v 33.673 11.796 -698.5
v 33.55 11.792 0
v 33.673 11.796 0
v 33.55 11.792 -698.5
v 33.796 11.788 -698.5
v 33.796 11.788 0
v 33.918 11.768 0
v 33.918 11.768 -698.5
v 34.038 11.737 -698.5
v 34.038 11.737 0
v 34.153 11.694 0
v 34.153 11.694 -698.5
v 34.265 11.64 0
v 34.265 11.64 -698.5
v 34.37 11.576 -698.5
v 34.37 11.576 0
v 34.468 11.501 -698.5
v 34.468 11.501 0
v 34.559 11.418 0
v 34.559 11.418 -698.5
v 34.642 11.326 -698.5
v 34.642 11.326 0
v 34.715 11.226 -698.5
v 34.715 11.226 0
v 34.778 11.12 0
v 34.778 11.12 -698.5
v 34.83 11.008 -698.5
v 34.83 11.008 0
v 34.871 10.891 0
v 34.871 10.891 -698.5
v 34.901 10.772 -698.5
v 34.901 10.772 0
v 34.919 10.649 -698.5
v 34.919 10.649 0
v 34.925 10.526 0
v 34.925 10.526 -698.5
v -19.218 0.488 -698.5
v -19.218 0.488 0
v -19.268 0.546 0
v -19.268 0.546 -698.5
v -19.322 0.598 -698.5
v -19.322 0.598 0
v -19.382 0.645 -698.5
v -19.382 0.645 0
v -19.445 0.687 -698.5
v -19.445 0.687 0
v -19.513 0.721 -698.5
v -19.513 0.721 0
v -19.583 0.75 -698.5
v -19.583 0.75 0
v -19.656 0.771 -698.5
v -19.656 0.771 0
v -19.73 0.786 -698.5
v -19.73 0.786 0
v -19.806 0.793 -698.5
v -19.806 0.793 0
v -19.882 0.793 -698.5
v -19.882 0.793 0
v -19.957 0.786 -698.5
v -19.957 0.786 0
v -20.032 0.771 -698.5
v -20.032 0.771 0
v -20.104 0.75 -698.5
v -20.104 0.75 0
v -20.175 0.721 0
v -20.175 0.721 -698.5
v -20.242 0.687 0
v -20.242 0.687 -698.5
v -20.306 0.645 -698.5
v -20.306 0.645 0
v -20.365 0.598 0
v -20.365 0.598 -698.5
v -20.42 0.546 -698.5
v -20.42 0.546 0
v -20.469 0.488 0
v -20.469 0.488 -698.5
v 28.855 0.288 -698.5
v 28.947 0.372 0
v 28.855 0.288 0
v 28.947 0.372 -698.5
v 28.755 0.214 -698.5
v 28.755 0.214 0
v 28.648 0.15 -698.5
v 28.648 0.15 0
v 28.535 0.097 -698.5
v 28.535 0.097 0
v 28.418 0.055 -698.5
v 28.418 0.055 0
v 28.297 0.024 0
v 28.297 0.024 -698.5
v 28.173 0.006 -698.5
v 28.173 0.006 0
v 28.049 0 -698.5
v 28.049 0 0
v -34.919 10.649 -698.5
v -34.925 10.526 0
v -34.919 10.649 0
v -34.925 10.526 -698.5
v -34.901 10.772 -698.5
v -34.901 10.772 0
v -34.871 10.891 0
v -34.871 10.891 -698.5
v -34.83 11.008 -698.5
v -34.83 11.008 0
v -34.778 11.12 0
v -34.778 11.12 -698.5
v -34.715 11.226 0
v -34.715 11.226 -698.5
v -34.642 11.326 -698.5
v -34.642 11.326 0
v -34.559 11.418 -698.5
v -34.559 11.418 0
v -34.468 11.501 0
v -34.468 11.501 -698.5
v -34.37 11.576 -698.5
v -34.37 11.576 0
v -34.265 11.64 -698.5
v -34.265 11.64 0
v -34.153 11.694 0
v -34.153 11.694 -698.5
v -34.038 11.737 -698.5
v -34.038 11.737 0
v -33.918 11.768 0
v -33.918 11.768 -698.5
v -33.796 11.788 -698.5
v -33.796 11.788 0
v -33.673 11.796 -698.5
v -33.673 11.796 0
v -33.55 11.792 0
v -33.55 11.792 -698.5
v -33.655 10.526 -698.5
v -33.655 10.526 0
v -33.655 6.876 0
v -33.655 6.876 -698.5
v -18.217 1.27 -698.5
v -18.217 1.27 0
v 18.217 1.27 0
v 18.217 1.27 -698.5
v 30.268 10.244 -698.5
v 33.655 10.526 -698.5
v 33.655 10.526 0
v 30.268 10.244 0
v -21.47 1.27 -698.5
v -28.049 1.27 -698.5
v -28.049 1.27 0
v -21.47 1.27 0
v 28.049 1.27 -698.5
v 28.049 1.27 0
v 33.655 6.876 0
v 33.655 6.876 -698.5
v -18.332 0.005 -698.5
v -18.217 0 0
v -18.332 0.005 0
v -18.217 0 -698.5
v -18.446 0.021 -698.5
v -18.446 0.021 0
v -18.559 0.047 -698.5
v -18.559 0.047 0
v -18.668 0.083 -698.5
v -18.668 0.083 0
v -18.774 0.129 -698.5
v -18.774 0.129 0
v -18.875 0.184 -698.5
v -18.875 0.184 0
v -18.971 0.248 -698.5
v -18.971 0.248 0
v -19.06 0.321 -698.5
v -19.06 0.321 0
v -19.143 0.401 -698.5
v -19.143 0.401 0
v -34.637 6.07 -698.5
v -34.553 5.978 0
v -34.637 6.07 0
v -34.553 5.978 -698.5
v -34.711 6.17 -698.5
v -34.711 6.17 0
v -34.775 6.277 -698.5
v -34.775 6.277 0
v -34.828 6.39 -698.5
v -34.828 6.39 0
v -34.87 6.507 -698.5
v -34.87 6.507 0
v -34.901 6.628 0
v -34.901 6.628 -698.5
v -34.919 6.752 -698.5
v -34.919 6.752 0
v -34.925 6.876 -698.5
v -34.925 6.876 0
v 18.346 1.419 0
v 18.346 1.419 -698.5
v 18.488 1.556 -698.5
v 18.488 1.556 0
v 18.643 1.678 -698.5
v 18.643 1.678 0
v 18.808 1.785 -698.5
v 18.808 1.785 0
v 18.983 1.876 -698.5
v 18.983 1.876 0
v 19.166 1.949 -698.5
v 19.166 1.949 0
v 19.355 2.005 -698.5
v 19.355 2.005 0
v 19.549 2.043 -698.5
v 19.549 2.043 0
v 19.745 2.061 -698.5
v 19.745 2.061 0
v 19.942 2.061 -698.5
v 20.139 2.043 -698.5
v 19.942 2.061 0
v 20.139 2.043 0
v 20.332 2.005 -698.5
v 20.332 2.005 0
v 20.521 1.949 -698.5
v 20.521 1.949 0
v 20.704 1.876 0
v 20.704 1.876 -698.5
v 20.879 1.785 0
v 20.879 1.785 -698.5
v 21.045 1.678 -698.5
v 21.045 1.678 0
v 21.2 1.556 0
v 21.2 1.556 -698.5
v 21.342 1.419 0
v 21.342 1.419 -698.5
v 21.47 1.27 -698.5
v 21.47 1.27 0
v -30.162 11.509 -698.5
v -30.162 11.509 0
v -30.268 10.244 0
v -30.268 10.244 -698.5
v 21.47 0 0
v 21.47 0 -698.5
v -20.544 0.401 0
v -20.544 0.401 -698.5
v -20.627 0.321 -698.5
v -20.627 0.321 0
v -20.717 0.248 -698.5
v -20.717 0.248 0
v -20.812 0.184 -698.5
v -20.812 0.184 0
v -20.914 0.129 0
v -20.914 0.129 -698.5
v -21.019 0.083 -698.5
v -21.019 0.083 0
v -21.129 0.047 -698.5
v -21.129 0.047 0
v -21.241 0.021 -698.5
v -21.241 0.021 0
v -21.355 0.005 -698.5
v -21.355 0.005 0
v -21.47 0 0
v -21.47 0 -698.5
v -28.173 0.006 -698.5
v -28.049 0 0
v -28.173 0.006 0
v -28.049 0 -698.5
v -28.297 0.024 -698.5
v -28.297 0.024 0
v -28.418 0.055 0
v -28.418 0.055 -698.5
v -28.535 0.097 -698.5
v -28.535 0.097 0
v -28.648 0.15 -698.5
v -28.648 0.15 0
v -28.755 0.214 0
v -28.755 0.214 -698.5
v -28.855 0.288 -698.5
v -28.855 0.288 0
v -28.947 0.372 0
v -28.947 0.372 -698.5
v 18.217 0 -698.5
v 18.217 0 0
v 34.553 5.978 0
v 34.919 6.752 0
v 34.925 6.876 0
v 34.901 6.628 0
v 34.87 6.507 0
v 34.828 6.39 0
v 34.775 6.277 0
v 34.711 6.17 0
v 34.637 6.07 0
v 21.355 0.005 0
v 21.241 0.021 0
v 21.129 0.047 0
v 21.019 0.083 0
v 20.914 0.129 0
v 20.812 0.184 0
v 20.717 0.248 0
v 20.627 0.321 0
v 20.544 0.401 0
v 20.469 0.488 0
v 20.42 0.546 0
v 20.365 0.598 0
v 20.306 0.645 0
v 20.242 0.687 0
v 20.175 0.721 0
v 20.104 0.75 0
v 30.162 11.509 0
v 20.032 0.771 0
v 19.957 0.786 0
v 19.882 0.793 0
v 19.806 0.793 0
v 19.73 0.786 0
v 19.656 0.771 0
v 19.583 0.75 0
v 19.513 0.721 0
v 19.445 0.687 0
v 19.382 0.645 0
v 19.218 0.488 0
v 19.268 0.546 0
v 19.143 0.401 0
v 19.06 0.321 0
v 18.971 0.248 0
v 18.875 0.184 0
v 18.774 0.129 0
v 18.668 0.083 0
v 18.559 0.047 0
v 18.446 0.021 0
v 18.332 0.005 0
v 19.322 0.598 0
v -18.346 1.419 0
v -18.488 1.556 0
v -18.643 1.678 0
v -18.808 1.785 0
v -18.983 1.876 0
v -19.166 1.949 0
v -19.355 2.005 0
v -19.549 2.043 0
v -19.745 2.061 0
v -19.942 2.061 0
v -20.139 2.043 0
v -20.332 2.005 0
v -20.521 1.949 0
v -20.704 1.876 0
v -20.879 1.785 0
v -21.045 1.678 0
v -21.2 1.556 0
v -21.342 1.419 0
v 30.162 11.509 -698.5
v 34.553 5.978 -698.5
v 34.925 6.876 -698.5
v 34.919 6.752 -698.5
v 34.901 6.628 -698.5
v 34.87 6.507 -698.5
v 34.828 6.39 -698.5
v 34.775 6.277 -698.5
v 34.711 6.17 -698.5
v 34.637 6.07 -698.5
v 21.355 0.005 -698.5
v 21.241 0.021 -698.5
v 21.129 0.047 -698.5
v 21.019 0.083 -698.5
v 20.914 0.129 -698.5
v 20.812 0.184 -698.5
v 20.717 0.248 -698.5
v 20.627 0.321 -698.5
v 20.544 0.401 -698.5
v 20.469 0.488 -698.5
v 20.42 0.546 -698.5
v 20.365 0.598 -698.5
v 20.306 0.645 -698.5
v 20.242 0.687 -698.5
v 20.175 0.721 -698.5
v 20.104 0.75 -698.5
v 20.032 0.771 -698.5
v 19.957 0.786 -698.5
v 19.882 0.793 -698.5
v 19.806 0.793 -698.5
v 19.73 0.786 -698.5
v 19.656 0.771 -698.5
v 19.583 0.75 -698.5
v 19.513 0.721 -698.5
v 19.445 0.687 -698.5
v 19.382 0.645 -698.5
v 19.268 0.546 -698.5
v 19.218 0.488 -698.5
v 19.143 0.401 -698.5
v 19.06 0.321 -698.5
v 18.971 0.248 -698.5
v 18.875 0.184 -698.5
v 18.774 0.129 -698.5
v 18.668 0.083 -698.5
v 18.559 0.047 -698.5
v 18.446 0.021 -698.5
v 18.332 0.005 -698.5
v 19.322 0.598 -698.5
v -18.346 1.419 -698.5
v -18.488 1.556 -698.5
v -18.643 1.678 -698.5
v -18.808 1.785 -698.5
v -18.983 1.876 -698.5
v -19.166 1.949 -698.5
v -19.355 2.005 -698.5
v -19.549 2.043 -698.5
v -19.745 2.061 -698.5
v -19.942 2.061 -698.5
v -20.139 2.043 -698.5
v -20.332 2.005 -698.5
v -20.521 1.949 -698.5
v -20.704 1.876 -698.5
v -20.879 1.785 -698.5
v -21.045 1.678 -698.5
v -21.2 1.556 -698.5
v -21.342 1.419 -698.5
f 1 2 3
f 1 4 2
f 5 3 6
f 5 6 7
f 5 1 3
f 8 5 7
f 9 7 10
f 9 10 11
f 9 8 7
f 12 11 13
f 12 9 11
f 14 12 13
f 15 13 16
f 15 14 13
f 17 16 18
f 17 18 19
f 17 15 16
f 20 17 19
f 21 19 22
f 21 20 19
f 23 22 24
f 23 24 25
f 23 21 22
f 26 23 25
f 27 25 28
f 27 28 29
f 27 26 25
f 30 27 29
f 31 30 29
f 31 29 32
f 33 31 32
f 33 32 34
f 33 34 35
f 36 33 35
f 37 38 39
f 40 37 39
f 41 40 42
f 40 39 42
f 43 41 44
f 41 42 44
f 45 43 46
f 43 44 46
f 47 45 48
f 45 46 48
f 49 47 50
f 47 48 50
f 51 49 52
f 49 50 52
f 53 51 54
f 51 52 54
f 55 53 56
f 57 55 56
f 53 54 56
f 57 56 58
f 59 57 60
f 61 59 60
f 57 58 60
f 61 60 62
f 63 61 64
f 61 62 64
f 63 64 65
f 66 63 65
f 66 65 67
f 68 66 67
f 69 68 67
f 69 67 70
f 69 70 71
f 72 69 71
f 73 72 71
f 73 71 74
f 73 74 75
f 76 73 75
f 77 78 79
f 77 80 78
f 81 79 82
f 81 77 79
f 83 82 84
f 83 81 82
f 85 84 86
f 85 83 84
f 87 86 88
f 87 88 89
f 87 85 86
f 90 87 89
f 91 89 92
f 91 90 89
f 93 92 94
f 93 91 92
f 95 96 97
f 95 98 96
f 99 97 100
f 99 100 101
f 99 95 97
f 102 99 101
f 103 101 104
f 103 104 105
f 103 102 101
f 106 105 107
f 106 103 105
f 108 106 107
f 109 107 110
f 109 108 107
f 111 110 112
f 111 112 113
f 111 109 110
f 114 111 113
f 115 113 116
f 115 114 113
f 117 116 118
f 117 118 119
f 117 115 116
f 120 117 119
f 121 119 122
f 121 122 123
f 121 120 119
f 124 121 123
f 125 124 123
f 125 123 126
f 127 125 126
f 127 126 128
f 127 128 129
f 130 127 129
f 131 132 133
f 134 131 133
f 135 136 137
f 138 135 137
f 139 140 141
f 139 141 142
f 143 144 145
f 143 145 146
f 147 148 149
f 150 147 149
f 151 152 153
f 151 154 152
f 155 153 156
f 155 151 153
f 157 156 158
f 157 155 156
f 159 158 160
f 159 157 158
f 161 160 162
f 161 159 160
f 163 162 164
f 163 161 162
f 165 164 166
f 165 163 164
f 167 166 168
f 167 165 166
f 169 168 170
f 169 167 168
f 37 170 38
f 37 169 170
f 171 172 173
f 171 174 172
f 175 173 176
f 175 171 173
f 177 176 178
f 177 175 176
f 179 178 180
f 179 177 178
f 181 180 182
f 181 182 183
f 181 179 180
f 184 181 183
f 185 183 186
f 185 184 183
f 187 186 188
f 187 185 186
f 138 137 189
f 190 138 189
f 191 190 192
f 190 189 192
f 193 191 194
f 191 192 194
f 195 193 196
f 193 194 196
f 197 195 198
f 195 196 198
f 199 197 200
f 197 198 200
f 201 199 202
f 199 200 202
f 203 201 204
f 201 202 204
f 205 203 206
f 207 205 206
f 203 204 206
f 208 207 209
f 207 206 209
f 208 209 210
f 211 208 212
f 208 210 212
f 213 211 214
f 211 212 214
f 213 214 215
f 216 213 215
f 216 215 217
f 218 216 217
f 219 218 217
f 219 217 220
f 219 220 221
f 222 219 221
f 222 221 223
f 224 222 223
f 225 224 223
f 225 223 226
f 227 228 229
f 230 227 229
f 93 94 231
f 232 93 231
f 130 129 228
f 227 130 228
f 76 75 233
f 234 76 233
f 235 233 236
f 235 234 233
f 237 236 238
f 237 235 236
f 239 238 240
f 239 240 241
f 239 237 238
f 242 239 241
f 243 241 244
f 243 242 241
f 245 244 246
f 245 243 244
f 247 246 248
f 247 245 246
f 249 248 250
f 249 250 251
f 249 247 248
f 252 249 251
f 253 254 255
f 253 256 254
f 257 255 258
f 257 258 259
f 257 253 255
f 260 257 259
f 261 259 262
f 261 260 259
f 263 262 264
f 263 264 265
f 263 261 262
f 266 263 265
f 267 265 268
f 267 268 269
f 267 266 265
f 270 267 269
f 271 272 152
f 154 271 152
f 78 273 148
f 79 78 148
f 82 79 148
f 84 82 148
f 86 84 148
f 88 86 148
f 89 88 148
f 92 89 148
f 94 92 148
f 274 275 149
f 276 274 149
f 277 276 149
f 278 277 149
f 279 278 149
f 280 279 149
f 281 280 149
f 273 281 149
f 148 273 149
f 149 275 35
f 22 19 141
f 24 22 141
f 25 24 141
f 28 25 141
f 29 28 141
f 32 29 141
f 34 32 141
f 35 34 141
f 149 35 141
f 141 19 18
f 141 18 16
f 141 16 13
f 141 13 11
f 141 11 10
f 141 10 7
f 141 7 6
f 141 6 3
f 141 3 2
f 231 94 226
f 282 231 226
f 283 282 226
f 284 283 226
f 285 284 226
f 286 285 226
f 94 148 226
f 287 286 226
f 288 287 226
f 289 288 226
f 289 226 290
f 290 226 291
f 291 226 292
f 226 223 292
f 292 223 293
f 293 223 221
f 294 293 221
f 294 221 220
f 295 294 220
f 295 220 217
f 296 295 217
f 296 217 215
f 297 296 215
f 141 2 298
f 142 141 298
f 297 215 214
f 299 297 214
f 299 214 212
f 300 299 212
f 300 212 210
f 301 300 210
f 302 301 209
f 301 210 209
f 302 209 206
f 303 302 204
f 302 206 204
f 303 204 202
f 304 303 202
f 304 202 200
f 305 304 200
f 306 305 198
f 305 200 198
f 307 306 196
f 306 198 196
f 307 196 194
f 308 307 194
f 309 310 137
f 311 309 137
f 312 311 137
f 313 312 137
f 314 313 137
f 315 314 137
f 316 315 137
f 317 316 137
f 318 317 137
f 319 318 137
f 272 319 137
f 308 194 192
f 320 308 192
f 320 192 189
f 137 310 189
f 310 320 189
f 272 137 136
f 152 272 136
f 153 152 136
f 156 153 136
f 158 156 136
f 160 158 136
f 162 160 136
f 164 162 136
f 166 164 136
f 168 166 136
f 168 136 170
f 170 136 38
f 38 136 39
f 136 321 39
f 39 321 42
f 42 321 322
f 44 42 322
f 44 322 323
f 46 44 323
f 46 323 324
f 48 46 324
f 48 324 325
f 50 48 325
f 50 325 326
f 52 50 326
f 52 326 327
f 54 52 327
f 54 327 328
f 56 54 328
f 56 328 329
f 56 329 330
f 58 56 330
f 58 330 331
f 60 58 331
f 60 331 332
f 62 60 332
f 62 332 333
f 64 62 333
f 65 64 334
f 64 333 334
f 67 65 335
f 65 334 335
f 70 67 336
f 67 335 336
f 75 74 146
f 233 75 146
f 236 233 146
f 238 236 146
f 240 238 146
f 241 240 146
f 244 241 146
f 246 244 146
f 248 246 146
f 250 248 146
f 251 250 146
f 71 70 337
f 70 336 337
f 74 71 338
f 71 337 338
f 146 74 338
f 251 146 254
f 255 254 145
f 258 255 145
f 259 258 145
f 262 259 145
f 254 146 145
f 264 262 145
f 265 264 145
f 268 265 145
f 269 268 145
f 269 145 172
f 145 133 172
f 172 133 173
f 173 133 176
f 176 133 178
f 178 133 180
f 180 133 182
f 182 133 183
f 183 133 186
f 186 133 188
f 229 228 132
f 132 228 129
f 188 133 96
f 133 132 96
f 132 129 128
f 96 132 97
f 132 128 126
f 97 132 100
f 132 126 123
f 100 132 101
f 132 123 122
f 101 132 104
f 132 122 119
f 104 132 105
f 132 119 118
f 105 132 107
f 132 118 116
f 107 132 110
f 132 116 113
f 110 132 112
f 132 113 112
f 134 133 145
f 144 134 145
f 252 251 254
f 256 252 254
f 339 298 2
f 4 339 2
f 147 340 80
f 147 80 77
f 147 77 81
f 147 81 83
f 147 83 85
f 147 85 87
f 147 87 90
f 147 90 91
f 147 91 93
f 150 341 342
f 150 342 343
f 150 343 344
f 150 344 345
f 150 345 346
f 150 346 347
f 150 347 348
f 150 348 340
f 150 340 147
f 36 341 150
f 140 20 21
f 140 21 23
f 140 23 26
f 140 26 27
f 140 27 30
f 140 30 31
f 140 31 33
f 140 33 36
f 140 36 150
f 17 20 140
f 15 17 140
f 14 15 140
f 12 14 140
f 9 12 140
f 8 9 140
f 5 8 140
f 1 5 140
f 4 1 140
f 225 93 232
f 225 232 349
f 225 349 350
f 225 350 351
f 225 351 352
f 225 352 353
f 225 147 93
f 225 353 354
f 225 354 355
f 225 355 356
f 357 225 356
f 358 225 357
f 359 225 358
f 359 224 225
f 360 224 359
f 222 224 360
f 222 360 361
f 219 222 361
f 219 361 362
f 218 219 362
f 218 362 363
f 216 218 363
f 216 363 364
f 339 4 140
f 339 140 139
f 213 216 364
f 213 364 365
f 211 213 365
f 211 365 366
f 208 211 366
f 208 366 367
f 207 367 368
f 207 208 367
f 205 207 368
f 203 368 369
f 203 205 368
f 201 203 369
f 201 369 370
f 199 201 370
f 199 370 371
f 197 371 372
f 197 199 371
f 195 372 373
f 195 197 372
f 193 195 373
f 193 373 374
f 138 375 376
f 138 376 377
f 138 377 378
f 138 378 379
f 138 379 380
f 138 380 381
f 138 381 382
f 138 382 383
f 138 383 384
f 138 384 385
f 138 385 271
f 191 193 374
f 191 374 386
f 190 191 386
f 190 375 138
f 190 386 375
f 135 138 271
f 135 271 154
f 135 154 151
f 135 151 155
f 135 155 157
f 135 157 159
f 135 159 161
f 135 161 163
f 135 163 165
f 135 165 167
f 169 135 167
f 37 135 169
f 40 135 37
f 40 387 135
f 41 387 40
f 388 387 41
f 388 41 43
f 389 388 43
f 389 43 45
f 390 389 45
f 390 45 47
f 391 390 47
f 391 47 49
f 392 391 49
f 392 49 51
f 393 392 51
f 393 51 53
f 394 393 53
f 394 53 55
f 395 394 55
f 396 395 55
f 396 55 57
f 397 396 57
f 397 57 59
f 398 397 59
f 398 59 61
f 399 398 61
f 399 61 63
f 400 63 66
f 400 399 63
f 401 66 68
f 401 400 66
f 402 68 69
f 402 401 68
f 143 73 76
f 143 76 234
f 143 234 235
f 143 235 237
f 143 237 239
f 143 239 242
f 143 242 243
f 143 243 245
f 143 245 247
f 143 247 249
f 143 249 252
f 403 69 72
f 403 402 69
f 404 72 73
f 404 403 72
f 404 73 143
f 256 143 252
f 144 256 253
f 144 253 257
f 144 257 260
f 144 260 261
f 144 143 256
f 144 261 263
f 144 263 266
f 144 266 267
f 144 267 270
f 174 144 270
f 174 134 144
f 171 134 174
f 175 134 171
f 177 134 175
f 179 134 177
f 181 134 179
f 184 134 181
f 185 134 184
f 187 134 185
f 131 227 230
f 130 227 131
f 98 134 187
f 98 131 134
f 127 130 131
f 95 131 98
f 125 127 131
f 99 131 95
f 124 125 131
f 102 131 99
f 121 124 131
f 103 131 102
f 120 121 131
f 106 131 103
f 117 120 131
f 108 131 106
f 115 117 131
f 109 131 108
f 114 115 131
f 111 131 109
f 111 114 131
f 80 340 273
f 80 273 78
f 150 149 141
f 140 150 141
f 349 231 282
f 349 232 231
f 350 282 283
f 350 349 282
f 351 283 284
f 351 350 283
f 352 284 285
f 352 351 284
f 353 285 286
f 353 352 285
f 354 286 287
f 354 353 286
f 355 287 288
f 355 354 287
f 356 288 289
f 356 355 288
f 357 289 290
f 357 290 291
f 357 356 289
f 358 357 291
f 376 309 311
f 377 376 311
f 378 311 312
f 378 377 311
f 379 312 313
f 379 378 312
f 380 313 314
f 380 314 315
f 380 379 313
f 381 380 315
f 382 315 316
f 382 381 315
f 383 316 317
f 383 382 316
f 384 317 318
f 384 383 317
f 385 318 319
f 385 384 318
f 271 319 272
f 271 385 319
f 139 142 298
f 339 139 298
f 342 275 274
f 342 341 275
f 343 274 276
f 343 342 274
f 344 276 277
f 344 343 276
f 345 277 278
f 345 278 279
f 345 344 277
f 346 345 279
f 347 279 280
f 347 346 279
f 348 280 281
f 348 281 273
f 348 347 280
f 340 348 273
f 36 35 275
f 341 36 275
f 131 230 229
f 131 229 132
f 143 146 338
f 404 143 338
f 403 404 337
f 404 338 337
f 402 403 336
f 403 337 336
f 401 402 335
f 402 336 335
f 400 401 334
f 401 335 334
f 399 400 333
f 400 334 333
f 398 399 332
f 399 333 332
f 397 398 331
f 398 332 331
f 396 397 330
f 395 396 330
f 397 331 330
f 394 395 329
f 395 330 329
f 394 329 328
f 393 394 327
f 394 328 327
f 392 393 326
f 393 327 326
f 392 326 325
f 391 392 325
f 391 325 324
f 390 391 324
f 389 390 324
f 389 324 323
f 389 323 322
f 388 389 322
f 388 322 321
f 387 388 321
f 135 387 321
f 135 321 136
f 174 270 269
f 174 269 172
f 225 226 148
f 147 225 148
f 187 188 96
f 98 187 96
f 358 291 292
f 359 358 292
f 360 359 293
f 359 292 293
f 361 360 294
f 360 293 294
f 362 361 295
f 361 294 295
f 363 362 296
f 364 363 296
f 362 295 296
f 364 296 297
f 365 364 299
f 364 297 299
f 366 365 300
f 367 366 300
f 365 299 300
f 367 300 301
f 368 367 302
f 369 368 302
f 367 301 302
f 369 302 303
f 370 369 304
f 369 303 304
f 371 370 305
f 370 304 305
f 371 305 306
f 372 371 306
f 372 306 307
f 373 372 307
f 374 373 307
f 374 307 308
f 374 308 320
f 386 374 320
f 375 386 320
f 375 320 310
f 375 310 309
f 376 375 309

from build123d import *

# Parameters (mm, degrees)
EXTRUDE_THIN1_DEPTH = 698.5
FILLET1_R           = 1.27


with BuildPart() as part:
    # Sketch1 → Extrude-Thin1 (new body)
    with BuildSketch(Plane.XY):
        with BuildLine():
            Line((30.1625, 11.509375), (34.925, 11.90625))
            Line((34.925, 11.90625), (34.925, 6.35))
            Line((34.925, 6.35), (28.575, 0))
            Line((28.575, 0), (20.6375, 0))
            ThreePointArc((20.6375, 0), (19.84375, 0.79375), (19.05, 0))
            Line((19.05, 0), (-19.05, 0))
            ThreePointArc((-19.05, 0), (-19.84375, 0.79375), (-20.6375, 0))
            Line((-20.6375, 0), (-28.575, 0))
            Line((-28.575, 0), (-34.925, 6.35))
            Line((-34.925, 6.35), (-34.925, 11.90625))
            Line((-34.925, 11.90625), (-30.1625, 11.509375))
            Line((-30.1625, 11.509375), (-30.267967759, 10.243761887))
            Line((-30.267967759, 10.243761887), (-33.655, 10.526014574))
            Line((-33.655, 10.526014574), (-33.655, 6.876051224))
            Line((-33.655, 6.876051224), (-28.048948776, 1.27))
            Line((-28.048948776, 1.27), (-21.470453434, 1.27))
            ThreePointArc((-21.470453434, 1.27), (-19.84375, 2.06375), (-18.217046566, 1.27))
            Line((-18.217046566, 1.27), (18.217046566, 1.27))
            ThreePointArc((18.217046566, 1.27), (19.84375, 2.06375), (21.470453434, 1.27))
            Line((21.470453434, 1.27), (28.048948776, 1.27))
            Line((28.048948776, 1.27), (33.655, 6.876051224))
            Line((33.655, 6.876051224), (33.655, 10.526014574))
            Line((33.655, 10.526014574), (30.267967759, 10.243761887))
            Line((30.267967759, 10.243761887), (30.1625, 11.509375))
        make_face()
    extrude(amount=-EXTRUDE_THIN1_DEPTH)

    # Fillet1
    fillet1_edges = [part.edges().sort_by_distance(p)[0] for p in [
        (34.925, 11.90625, -349.25),
        (34.925, 6.35, -349.25),
        (28.575, 0, -349.25),
        (20.6375, 0, -349.25),
        (19.05, 0, -349.25),
        (-19.05, 0, -349.25),
        (-20.6375, 0, -349.25),
        (-28.575, 0, -349.25),
        (-34.925, 6.35, -349.25),
        (-34.925, 11.90625, -349.25),
    ]]
    fillet(fillet1_edges, radius=FILLET1_R)


solid = part.part
